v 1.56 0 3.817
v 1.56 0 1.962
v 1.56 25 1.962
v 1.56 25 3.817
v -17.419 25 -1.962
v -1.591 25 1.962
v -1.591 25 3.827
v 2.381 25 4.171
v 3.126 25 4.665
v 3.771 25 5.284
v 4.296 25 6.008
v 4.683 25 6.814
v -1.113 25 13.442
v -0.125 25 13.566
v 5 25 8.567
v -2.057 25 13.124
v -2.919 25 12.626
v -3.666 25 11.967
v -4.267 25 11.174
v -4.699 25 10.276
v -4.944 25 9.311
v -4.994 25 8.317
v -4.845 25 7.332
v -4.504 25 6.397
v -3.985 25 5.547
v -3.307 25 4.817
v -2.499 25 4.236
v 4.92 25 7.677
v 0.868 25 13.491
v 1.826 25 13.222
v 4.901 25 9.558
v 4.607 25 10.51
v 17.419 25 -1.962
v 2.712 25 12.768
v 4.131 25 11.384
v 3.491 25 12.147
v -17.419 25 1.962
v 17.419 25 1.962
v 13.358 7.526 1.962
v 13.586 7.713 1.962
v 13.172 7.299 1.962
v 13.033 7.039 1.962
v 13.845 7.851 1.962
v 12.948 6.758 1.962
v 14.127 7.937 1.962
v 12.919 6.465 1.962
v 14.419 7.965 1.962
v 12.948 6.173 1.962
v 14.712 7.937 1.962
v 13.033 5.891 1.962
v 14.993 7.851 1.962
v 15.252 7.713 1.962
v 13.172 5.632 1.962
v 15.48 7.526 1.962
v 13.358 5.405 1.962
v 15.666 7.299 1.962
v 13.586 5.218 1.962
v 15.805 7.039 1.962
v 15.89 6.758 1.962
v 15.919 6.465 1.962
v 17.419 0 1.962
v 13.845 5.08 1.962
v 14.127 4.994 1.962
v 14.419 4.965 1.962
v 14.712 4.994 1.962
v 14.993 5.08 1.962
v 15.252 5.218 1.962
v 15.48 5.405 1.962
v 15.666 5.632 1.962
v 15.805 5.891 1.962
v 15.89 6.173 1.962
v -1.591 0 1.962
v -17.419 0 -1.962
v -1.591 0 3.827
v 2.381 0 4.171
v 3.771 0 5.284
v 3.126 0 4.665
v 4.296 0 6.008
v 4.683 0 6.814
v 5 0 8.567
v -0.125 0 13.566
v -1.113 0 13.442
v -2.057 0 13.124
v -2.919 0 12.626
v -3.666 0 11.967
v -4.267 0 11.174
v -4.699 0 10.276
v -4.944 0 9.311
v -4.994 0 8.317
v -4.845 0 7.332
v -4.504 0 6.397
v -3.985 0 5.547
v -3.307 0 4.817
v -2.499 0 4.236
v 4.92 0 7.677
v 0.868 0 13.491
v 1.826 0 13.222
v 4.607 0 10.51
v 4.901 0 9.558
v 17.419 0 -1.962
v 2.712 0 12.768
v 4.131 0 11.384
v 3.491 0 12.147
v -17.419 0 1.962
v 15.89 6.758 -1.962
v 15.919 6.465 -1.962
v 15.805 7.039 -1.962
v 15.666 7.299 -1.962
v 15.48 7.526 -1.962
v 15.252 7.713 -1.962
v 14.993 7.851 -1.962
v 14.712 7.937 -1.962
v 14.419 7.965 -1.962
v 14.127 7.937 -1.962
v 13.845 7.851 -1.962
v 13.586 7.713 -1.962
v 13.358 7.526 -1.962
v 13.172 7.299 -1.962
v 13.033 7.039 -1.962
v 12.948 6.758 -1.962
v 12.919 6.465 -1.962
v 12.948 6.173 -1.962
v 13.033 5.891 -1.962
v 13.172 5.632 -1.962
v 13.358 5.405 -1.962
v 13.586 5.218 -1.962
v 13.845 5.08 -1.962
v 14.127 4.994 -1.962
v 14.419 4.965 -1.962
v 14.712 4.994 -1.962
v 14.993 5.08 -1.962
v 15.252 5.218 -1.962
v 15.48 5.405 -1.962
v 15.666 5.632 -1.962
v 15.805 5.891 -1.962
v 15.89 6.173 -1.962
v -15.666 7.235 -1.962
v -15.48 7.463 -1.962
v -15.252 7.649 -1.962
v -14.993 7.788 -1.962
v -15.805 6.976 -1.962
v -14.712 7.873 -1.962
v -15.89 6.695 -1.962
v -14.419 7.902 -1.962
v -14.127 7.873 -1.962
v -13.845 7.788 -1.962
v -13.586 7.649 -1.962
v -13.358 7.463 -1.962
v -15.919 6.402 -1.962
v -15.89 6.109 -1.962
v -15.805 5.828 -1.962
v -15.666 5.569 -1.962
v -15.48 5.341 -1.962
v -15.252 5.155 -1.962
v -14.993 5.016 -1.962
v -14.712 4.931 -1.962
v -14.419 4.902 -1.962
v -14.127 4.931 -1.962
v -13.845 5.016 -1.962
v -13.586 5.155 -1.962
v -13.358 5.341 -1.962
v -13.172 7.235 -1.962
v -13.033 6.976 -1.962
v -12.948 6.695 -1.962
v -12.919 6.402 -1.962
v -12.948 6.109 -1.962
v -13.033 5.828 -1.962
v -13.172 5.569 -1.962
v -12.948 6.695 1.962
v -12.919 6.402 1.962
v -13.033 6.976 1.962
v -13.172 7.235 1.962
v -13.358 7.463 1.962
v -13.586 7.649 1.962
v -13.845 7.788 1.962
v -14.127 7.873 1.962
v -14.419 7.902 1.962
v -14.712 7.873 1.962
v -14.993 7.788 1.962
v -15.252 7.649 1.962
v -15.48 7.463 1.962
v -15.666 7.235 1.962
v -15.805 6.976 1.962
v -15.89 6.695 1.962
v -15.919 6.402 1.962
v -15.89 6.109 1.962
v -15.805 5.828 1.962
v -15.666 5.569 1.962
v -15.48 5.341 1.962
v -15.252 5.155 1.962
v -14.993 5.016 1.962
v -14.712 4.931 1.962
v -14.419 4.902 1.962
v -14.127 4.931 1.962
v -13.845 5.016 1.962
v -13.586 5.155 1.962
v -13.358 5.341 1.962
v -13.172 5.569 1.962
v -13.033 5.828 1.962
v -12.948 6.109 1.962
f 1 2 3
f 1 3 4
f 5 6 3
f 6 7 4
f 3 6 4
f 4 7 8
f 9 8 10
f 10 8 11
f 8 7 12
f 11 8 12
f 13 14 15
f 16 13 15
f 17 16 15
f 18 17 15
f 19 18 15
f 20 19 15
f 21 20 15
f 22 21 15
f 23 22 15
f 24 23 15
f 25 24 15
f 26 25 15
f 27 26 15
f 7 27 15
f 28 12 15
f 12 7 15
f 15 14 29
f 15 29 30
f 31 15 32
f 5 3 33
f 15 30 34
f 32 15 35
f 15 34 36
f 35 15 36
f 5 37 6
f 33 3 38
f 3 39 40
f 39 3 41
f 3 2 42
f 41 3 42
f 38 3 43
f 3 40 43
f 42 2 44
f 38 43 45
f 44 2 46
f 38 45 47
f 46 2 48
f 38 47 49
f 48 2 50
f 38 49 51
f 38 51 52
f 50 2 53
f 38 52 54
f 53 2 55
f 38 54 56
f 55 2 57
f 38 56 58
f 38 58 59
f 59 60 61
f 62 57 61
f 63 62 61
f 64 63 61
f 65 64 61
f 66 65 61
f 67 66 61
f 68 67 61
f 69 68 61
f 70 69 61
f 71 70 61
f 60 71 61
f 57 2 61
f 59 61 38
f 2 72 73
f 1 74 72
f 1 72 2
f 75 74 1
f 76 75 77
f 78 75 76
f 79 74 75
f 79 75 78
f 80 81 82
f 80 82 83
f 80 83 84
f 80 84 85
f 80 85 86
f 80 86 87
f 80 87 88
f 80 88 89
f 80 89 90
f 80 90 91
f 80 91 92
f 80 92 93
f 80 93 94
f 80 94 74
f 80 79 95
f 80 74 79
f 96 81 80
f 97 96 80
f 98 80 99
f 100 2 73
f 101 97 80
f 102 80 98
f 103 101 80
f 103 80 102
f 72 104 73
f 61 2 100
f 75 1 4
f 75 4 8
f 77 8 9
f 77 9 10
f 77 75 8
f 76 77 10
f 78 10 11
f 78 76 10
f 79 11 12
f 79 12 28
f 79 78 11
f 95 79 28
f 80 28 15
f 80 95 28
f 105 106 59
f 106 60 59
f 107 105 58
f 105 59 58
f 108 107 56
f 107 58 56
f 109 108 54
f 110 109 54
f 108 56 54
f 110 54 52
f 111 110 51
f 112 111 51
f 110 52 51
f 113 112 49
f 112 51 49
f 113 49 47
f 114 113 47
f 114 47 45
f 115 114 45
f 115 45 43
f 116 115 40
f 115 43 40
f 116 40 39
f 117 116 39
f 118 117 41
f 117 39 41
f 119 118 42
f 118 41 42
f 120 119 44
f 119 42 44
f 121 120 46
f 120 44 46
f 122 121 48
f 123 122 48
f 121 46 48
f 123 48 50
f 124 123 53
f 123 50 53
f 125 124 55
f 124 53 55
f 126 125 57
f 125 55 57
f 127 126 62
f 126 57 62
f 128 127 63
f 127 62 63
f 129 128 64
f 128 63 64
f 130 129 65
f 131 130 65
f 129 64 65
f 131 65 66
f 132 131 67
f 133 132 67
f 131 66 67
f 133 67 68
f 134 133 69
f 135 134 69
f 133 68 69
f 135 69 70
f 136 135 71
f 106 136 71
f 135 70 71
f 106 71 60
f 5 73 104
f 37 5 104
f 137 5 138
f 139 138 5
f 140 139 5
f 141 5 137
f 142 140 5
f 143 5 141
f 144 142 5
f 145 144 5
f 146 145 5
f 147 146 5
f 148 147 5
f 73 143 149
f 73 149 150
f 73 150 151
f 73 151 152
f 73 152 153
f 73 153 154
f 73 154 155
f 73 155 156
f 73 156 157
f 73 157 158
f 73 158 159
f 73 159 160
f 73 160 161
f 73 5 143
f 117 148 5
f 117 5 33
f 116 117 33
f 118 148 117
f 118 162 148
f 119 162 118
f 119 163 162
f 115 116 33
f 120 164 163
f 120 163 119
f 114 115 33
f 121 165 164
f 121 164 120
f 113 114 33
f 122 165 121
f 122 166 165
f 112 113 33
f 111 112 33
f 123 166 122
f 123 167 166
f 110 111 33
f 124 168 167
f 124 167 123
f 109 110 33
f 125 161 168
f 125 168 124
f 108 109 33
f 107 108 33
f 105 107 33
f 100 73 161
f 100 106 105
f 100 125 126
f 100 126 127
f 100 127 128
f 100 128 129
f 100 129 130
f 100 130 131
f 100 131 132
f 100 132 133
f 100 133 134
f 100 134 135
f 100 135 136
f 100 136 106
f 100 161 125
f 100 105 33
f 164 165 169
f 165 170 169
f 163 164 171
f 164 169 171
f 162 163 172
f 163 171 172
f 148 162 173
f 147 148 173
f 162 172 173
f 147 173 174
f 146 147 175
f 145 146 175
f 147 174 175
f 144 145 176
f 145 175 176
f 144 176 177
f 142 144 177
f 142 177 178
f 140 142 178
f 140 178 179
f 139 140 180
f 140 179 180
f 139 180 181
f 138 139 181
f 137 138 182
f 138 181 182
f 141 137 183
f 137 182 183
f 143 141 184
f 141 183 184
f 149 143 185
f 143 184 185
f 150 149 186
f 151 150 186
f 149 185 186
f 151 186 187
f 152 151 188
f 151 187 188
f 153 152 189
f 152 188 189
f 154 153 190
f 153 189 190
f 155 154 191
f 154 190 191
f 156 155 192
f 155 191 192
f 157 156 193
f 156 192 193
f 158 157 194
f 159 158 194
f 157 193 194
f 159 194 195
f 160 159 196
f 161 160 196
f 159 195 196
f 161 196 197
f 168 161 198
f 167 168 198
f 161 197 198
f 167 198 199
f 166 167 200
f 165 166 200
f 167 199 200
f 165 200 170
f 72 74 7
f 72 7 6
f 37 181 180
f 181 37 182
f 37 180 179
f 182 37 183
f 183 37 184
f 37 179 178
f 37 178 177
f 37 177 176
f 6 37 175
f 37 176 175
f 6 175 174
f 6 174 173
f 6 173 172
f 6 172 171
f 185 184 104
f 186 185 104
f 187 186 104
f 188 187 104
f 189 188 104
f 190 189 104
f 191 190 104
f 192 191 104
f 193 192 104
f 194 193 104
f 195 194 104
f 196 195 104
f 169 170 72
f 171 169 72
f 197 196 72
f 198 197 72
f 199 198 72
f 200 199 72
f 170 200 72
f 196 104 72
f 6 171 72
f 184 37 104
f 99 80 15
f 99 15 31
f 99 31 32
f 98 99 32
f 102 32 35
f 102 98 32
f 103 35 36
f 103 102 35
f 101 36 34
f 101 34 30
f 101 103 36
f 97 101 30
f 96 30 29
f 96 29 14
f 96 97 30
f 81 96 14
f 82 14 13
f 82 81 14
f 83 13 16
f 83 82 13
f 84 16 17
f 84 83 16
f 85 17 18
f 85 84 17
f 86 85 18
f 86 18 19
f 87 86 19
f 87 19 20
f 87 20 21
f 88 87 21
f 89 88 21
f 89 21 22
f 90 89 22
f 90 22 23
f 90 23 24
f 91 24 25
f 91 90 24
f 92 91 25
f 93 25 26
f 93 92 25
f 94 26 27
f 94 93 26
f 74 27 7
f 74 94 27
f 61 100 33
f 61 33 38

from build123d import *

# Parameters (mm, degrees)
F0_W     = 3.1506001928
F0_H     = 3.9233311644
F0_W_2   = 15.8593781031
F0_W_3   = 15.828302058
F2_DEPTH = 25
F1_R     = 1.5
F3_DEPTH = 6
F4_DEPTH = 6


with BuildPart() as f2:
    # F0 (on Front) → F2 (new body)
    with BuildSketch(Plane.XZ):
        with BuildLine():
            ThreePointArc((5, 8.5672423611), (-2.9194014288, 12.6264412103), (-1.5908381189, 3.827069993))
            Line((-1.5908381189, 3.827069993), (-1.5908381189, 8.5672423611))
            Line((-1.5908381189, 8.5672423611), (1.5597620739, 8.5672423611))
            Line((1.5597620739, 8.5672423611), (1.5597620739, 3.8167537259))
            ThreePointArc((1.5597620739, 3.8167537259), (4.049617906, 5.6345652879), (5, 8.5672423611))
        make_face()
        with BuildLine():
            Line((-1.5908381189, 8.5672423611), (-1.5908381189, 3.827069993))
            ThreePointArc((-1.5908381189, 3.827069993), (-0.0163718198, 3.5672691648), (1.5597620739, 3.8167537259))
            Line((1.5597620739, 3.8167537259), (1.5597620739, 8.5672423611))
            Line((1.5597620739, 8.5672423611), (-1.5908381189, 8.5672423611))
        make_face()
        with Locations((-0.0155380225, 0)):
            Rectangle(F0_W, F0_H)
        with BuildLine():
            Line((-1.5908381189, 3.827069993), (-1.5908381189, 1.9616655822))
            Line((-1.5908381189, 1.9616655822), (1.5597620739, 1.9616655822))
            Line((1.5597620739, 1.9616655822), (1.5597620739, 3.8167537259))
            ThreePointArc((1.5597620739, 3.8167537259), (-0.0163718198, 3.5672691648), (-1.5908381189, 3.827069993))
        make_face()
        with Locations((9.4894511254, 0)):
            Rectangle(F0_W_2, F0_H)
        with Locations((-9.5049891479, 0)):
            Rectangle(F0_W_3, F0_H)
    extrude(amount=-F2_DEPTH)

    # F1 (on Top) → F3 (cut, symmetric)
    with BuildSketch(Plane.XY):
        with Locations((14.419140177, 6.4654615708)):
            Circle(F1_R)
    extrude(amount=F3_DEPTH, both=True, mode=Mode.SUBTRACT)

    # F1 (on Top) → F4 (cut, symmetric)
    with BuildSketch(Plane.XY):
        with Locations((-14.419140177, 6.4020673744)):
            Circle(F1_R)
    extrude(amount=F4_DEPTH, both=True, mode=Mode.SUBTRACT)


solid = f2.part
